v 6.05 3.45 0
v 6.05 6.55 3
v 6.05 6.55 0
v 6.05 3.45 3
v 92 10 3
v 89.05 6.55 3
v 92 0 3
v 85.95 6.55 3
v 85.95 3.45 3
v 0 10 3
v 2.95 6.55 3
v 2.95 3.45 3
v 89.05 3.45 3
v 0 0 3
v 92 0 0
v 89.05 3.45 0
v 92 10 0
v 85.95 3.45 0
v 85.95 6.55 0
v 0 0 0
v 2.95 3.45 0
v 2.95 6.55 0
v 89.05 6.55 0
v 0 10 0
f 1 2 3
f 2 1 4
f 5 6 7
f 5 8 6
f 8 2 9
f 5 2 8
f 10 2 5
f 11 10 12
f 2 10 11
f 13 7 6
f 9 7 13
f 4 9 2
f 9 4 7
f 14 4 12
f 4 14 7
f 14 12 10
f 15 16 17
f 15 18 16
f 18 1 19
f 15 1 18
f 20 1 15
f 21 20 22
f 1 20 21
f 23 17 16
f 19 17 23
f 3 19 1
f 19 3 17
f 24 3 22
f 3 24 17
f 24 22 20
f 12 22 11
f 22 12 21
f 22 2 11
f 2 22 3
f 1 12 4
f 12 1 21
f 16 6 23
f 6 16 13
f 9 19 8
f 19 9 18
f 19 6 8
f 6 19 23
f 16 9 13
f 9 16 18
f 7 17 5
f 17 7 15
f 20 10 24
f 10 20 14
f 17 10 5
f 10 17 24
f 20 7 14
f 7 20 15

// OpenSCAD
lct=3;//laser cut thickness
h_tol=.05;//hole tolerance
dim_x = 86+lct+lct;
dim_y = 10;
difference(){
cube([dim_x,dim_y,lct]);//the cuboid
for(x=[lct-h_tol,dim_x-(lct*2)-h_tol])translate([x,((dim_y-lct)/2)-h_tol,0])cube([lct+2*h_tol,lct+2*h_tol,lct]);//screw holes

}
